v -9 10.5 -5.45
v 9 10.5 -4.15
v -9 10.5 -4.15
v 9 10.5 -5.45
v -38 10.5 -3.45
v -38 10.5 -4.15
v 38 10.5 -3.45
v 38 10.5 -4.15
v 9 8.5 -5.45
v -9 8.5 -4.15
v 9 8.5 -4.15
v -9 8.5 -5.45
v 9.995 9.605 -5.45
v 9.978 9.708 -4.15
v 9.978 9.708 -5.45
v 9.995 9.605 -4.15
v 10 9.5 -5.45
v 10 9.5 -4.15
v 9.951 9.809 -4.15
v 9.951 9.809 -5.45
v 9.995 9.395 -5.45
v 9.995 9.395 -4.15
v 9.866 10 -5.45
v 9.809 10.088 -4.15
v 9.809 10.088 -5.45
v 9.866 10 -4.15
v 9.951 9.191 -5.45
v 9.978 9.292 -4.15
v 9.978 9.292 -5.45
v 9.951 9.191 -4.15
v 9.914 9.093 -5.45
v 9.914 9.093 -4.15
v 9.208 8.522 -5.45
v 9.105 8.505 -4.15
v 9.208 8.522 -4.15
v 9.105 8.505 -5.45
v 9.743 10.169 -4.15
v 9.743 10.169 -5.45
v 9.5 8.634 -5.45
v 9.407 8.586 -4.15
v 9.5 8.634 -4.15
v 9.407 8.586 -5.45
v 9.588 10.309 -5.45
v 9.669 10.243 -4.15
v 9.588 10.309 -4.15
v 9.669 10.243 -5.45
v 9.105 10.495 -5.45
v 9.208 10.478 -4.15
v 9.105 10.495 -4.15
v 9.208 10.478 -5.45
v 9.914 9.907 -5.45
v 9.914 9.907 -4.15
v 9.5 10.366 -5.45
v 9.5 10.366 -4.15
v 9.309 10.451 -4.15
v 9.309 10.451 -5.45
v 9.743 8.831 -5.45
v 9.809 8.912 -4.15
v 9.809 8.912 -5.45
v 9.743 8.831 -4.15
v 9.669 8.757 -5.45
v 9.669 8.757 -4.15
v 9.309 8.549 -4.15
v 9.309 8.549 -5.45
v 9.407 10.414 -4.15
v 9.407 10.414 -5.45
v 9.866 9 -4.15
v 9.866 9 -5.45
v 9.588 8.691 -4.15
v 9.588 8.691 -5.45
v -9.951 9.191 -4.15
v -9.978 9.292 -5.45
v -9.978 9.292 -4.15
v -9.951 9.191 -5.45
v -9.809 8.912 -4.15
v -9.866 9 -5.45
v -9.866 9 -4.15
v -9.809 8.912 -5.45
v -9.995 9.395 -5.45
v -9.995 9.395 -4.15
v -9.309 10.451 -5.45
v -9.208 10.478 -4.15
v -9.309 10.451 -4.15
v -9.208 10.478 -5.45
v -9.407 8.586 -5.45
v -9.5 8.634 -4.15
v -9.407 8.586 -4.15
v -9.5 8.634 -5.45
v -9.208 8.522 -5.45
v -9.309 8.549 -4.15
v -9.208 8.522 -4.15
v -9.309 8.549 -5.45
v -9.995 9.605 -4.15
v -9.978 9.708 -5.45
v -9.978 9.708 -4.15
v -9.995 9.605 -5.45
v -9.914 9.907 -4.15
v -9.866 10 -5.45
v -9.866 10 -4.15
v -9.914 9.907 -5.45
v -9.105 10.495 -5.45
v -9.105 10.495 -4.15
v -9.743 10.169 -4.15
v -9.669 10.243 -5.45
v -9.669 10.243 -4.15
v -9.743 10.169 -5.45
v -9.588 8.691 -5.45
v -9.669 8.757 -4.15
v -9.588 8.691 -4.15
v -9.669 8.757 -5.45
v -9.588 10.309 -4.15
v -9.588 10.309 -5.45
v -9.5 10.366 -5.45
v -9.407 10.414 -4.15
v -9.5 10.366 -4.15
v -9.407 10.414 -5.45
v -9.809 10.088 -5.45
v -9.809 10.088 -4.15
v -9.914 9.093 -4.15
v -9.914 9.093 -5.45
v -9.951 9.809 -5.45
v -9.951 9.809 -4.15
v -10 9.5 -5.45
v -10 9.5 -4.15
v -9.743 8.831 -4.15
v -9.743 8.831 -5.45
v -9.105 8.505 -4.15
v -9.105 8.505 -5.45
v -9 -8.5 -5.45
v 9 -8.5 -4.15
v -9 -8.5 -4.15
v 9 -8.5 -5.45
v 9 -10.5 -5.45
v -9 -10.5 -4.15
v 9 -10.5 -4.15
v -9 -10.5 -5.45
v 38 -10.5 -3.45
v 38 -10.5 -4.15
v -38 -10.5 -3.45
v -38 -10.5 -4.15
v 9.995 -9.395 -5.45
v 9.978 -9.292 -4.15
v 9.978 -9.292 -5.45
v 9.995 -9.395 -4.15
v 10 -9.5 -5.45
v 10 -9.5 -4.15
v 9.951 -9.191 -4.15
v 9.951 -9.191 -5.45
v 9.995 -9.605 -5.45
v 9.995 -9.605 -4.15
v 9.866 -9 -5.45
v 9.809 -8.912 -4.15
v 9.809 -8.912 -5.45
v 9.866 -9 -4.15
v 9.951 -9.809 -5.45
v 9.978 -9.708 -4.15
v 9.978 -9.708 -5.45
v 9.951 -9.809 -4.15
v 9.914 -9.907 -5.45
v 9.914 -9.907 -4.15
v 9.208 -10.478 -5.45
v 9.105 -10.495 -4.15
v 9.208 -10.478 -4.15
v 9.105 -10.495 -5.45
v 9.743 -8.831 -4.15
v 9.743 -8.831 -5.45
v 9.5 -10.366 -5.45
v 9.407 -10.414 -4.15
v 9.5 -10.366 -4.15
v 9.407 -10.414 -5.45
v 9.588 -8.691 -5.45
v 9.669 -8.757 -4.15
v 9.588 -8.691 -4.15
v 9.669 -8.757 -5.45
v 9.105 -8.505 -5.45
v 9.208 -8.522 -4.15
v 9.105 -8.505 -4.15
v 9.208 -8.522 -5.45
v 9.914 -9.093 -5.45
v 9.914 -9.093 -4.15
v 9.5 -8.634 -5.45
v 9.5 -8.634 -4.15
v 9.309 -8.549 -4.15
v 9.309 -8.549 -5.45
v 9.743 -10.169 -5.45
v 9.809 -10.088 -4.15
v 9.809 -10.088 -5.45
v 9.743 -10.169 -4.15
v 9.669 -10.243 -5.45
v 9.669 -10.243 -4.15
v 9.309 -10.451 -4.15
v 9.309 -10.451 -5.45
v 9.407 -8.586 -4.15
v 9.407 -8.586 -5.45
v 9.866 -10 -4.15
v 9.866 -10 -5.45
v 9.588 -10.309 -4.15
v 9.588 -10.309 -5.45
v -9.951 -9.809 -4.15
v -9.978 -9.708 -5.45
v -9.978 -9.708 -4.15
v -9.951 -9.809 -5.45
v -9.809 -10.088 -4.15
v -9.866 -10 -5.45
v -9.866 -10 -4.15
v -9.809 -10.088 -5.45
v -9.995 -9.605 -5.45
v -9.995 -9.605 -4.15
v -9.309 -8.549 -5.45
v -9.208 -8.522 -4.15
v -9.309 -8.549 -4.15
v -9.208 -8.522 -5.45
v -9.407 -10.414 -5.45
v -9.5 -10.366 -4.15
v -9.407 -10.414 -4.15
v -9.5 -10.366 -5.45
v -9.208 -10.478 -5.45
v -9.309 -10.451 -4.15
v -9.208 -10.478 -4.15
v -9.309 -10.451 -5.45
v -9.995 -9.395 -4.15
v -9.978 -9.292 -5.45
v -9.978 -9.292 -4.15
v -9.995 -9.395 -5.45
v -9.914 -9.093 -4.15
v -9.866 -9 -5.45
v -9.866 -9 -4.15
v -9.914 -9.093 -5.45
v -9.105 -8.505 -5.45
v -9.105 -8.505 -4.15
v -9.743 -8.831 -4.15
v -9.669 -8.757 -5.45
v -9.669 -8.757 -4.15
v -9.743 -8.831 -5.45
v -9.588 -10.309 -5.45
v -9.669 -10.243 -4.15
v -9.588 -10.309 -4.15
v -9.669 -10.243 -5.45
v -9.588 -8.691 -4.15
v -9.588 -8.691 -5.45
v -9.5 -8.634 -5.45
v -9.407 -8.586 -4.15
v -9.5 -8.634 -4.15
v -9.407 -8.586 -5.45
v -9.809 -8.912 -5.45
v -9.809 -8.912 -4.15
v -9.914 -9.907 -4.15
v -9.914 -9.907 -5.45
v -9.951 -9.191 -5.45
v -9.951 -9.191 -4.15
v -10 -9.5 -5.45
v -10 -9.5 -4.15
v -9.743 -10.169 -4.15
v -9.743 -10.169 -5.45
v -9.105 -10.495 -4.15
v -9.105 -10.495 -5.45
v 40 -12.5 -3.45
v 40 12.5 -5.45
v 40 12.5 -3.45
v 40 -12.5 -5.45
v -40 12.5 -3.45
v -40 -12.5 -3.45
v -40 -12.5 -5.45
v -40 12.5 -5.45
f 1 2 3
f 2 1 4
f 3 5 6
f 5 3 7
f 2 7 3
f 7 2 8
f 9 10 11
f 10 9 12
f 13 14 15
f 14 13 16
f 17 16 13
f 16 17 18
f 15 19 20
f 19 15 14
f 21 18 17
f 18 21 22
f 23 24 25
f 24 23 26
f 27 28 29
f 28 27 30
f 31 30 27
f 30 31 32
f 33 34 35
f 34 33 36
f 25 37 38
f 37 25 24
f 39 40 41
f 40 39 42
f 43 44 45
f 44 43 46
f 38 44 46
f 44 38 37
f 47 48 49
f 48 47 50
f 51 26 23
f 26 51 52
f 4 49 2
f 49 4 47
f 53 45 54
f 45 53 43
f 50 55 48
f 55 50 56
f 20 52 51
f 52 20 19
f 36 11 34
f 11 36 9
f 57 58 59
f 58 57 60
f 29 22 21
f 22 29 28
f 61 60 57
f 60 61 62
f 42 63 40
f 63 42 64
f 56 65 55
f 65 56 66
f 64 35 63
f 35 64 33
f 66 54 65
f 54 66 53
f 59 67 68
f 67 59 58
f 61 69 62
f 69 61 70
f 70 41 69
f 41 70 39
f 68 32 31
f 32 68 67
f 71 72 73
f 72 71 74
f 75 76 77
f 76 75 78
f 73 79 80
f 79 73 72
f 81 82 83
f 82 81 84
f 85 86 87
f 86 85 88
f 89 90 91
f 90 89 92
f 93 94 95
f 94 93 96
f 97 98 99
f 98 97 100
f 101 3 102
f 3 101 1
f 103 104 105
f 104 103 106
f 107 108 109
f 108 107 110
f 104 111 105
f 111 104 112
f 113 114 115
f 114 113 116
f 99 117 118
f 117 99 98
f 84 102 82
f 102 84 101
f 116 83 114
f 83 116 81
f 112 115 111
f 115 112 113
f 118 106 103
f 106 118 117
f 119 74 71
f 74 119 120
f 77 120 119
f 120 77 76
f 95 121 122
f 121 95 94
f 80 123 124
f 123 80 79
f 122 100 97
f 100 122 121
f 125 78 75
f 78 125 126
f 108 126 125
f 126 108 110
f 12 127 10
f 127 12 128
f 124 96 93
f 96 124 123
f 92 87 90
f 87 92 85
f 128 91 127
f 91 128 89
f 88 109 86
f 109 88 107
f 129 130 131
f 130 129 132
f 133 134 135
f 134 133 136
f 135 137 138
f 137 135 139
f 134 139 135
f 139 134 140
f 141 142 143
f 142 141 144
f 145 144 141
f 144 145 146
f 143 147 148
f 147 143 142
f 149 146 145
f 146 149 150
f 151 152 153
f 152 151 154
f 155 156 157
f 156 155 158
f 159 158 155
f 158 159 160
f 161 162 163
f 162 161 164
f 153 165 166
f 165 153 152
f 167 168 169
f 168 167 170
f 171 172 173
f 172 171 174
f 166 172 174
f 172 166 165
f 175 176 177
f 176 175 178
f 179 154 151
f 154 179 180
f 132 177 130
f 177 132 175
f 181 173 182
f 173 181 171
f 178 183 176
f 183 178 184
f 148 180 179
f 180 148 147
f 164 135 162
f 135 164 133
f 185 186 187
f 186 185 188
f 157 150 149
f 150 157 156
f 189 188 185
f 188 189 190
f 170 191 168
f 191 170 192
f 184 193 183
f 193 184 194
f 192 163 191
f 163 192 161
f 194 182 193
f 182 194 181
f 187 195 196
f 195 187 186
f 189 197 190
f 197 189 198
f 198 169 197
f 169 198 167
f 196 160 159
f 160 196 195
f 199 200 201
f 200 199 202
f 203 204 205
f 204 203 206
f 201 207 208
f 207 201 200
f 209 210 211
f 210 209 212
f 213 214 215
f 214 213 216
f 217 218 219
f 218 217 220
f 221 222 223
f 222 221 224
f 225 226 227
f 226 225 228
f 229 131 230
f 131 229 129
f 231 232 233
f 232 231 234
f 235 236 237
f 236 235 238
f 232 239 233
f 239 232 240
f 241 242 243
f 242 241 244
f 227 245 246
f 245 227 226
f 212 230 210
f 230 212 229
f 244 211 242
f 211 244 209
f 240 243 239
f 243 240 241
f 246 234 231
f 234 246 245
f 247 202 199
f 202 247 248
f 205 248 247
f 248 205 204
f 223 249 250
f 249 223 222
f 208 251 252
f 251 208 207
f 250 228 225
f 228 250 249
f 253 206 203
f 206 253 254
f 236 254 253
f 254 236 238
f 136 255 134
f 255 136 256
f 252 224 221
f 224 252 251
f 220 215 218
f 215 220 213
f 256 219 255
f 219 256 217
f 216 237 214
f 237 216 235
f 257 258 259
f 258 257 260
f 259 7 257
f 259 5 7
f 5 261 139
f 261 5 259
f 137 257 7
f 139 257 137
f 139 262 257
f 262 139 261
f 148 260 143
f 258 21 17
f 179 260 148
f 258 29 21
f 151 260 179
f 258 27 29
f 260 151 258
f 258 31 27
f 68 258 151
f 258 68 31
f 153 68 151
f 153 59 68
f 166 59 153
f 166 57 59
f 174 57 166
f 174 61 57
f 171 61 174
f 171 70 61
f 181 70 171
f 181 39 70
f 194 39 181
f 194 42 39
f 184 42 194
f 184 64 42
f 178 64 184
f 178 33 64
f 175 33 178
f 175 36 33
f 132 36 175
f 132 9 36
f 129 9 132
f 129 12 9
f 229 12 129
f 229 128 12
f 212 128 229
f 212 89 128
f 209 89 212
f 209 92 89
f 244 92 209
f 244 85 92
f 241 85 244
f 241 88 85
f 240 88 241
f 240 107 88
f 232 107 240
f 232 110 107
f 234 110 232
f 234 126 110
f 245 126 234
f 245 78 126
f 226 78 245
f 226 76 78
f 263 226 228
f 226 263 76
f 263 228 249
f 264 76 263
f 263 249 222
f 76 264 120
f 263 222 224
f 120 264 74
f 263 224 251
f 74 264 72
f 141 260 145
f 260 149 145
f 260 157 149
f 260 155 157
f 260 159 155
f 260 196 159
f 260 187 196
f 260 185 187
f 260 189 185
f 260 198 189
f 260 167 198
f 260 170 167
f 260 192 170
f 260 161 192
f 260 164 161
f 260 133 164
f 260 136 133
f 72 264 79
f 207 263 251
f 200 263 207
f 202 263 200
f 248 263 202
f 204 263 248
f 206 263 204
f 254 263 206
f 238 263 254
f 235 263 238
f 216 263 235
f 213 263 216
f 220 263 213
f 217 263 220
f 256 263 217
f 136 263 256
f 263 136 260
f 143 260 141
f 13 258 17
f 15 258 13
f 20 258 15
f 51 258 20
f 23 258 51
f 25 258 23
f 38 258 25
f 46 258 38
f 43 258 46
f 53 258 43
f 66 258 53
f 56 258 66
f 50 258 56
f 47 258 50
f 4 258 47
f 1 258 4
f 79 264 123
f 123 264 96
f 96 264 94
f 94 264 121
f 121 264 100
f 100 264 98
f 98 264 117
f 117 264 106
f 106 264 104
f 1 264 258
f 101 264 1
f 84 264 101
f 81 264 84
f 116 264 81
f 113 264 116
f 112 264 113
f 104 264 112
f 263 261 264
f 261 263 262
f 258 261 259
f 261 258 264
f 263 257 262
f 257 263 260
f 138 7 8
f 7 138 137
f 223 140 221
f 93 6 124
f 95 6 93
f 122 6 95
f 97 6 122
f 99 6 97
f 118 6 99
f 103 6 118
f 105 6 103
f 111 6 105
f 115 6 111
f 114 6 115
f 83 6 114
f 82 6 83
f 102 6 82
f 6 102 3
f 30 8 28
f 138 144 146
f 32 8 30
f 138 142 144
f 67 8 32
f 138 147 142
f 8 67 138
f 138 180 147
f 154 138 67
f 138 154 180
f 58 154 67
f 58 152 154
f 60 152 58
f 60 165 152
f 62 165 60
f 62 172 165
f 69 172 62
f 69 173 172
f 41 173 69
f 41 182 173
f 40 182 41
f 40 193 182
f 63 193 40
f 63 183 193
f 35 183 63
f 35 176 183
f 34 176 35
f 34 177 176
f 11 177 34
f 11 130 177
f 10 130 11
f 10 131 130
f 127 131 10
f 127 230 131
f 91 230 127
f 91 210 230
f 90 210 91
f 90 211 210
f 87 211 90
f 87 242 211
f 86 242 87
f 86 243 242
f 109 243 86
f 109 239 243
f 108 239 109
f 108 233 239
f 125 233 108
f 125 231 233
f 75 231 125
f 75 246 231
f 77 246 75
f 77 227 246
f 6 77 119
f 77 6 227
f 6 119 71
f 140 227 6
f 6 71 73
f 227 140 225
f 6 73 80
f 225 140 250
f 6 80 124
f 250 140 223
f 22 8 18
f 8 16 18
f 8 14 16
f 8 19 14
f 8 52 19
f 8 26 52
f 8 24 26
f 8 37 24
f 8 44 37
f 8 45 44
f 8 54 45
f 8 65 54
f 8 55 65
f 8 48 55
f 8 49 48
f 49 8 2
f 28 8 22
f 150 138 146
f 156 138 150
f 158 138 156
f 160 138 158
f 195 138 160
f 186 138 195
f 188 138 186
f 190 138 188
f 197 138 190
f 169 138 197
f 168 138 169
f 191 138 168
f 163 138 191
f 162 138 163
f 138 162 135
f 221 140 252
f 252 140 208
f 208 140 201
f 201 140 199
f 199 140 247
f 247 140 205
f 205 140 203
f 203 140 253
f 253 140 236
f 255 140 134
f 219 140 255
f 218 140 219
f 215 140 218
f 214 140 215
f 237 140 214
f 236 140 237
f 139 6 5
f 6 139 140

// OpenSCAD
// Center mounting plate for a drone frame, print with low density fill

//=======================================================================
// Config
//=======================================================================
//beam diameter
dia1=6.5;

//wall thickness main cross beam
wall=1.5;

//mounting plate
plate_w = 25;
plate_l = 80;
plate_h = .6;

//strap
strap_l = 18;
strap_w = 2;


edge_w = 2;
edge_h = 2;

//=======================================================================

$fn=60;  //number of facets
out1 = dia1+2*wall; //outside diameter


strap_y = plate_w/2-strap_w/2-edge_h;
  
difference() {
  union() {
    translate([0,0,-out1/2+plate_h/2]) cube([plate_l,plate_w,edge_h],center=true);
    
    //strengthen edges
    //translate([0,+(strap_y+strap_w/2+strap_edge/2),-out1/2+strap_h/2]) cube([plate_l,strap_edge,strap_h],center=true);
    //translate([0,-(strap_y+strap_w/2+strap_edge/2),-out1/2+strap_h/2]) cube([plate_l,strap_edge,strap_h],center=true);
  }
  cube([plate_l-edge_w*2,plate_w-2*edge_w,out1-2*plate_h],center=true);

  //drill holes
  //rotate([90,0,45]) cylinder(h=999,d=dia1,center=true);
  //rotate([90,0,-45]) cylinder(h=999,d=dia1,center=true);
  
  //drill strap holes

  translate([0,+strap_y,0]) StrapHole();
  translate([0,-strap_y,0]) StrapHole();
}




module StrapHole() {
  union() {
    cube([strap_l,strap_w,999],center=true);
    translate([+strap_l/2,0,0]) cylinder(h=999,d=strap_w,center=true);
    translate([-strap_l/2,0,0]) cylinder(h=999,d=strap_w,center=true);    
  }
}
